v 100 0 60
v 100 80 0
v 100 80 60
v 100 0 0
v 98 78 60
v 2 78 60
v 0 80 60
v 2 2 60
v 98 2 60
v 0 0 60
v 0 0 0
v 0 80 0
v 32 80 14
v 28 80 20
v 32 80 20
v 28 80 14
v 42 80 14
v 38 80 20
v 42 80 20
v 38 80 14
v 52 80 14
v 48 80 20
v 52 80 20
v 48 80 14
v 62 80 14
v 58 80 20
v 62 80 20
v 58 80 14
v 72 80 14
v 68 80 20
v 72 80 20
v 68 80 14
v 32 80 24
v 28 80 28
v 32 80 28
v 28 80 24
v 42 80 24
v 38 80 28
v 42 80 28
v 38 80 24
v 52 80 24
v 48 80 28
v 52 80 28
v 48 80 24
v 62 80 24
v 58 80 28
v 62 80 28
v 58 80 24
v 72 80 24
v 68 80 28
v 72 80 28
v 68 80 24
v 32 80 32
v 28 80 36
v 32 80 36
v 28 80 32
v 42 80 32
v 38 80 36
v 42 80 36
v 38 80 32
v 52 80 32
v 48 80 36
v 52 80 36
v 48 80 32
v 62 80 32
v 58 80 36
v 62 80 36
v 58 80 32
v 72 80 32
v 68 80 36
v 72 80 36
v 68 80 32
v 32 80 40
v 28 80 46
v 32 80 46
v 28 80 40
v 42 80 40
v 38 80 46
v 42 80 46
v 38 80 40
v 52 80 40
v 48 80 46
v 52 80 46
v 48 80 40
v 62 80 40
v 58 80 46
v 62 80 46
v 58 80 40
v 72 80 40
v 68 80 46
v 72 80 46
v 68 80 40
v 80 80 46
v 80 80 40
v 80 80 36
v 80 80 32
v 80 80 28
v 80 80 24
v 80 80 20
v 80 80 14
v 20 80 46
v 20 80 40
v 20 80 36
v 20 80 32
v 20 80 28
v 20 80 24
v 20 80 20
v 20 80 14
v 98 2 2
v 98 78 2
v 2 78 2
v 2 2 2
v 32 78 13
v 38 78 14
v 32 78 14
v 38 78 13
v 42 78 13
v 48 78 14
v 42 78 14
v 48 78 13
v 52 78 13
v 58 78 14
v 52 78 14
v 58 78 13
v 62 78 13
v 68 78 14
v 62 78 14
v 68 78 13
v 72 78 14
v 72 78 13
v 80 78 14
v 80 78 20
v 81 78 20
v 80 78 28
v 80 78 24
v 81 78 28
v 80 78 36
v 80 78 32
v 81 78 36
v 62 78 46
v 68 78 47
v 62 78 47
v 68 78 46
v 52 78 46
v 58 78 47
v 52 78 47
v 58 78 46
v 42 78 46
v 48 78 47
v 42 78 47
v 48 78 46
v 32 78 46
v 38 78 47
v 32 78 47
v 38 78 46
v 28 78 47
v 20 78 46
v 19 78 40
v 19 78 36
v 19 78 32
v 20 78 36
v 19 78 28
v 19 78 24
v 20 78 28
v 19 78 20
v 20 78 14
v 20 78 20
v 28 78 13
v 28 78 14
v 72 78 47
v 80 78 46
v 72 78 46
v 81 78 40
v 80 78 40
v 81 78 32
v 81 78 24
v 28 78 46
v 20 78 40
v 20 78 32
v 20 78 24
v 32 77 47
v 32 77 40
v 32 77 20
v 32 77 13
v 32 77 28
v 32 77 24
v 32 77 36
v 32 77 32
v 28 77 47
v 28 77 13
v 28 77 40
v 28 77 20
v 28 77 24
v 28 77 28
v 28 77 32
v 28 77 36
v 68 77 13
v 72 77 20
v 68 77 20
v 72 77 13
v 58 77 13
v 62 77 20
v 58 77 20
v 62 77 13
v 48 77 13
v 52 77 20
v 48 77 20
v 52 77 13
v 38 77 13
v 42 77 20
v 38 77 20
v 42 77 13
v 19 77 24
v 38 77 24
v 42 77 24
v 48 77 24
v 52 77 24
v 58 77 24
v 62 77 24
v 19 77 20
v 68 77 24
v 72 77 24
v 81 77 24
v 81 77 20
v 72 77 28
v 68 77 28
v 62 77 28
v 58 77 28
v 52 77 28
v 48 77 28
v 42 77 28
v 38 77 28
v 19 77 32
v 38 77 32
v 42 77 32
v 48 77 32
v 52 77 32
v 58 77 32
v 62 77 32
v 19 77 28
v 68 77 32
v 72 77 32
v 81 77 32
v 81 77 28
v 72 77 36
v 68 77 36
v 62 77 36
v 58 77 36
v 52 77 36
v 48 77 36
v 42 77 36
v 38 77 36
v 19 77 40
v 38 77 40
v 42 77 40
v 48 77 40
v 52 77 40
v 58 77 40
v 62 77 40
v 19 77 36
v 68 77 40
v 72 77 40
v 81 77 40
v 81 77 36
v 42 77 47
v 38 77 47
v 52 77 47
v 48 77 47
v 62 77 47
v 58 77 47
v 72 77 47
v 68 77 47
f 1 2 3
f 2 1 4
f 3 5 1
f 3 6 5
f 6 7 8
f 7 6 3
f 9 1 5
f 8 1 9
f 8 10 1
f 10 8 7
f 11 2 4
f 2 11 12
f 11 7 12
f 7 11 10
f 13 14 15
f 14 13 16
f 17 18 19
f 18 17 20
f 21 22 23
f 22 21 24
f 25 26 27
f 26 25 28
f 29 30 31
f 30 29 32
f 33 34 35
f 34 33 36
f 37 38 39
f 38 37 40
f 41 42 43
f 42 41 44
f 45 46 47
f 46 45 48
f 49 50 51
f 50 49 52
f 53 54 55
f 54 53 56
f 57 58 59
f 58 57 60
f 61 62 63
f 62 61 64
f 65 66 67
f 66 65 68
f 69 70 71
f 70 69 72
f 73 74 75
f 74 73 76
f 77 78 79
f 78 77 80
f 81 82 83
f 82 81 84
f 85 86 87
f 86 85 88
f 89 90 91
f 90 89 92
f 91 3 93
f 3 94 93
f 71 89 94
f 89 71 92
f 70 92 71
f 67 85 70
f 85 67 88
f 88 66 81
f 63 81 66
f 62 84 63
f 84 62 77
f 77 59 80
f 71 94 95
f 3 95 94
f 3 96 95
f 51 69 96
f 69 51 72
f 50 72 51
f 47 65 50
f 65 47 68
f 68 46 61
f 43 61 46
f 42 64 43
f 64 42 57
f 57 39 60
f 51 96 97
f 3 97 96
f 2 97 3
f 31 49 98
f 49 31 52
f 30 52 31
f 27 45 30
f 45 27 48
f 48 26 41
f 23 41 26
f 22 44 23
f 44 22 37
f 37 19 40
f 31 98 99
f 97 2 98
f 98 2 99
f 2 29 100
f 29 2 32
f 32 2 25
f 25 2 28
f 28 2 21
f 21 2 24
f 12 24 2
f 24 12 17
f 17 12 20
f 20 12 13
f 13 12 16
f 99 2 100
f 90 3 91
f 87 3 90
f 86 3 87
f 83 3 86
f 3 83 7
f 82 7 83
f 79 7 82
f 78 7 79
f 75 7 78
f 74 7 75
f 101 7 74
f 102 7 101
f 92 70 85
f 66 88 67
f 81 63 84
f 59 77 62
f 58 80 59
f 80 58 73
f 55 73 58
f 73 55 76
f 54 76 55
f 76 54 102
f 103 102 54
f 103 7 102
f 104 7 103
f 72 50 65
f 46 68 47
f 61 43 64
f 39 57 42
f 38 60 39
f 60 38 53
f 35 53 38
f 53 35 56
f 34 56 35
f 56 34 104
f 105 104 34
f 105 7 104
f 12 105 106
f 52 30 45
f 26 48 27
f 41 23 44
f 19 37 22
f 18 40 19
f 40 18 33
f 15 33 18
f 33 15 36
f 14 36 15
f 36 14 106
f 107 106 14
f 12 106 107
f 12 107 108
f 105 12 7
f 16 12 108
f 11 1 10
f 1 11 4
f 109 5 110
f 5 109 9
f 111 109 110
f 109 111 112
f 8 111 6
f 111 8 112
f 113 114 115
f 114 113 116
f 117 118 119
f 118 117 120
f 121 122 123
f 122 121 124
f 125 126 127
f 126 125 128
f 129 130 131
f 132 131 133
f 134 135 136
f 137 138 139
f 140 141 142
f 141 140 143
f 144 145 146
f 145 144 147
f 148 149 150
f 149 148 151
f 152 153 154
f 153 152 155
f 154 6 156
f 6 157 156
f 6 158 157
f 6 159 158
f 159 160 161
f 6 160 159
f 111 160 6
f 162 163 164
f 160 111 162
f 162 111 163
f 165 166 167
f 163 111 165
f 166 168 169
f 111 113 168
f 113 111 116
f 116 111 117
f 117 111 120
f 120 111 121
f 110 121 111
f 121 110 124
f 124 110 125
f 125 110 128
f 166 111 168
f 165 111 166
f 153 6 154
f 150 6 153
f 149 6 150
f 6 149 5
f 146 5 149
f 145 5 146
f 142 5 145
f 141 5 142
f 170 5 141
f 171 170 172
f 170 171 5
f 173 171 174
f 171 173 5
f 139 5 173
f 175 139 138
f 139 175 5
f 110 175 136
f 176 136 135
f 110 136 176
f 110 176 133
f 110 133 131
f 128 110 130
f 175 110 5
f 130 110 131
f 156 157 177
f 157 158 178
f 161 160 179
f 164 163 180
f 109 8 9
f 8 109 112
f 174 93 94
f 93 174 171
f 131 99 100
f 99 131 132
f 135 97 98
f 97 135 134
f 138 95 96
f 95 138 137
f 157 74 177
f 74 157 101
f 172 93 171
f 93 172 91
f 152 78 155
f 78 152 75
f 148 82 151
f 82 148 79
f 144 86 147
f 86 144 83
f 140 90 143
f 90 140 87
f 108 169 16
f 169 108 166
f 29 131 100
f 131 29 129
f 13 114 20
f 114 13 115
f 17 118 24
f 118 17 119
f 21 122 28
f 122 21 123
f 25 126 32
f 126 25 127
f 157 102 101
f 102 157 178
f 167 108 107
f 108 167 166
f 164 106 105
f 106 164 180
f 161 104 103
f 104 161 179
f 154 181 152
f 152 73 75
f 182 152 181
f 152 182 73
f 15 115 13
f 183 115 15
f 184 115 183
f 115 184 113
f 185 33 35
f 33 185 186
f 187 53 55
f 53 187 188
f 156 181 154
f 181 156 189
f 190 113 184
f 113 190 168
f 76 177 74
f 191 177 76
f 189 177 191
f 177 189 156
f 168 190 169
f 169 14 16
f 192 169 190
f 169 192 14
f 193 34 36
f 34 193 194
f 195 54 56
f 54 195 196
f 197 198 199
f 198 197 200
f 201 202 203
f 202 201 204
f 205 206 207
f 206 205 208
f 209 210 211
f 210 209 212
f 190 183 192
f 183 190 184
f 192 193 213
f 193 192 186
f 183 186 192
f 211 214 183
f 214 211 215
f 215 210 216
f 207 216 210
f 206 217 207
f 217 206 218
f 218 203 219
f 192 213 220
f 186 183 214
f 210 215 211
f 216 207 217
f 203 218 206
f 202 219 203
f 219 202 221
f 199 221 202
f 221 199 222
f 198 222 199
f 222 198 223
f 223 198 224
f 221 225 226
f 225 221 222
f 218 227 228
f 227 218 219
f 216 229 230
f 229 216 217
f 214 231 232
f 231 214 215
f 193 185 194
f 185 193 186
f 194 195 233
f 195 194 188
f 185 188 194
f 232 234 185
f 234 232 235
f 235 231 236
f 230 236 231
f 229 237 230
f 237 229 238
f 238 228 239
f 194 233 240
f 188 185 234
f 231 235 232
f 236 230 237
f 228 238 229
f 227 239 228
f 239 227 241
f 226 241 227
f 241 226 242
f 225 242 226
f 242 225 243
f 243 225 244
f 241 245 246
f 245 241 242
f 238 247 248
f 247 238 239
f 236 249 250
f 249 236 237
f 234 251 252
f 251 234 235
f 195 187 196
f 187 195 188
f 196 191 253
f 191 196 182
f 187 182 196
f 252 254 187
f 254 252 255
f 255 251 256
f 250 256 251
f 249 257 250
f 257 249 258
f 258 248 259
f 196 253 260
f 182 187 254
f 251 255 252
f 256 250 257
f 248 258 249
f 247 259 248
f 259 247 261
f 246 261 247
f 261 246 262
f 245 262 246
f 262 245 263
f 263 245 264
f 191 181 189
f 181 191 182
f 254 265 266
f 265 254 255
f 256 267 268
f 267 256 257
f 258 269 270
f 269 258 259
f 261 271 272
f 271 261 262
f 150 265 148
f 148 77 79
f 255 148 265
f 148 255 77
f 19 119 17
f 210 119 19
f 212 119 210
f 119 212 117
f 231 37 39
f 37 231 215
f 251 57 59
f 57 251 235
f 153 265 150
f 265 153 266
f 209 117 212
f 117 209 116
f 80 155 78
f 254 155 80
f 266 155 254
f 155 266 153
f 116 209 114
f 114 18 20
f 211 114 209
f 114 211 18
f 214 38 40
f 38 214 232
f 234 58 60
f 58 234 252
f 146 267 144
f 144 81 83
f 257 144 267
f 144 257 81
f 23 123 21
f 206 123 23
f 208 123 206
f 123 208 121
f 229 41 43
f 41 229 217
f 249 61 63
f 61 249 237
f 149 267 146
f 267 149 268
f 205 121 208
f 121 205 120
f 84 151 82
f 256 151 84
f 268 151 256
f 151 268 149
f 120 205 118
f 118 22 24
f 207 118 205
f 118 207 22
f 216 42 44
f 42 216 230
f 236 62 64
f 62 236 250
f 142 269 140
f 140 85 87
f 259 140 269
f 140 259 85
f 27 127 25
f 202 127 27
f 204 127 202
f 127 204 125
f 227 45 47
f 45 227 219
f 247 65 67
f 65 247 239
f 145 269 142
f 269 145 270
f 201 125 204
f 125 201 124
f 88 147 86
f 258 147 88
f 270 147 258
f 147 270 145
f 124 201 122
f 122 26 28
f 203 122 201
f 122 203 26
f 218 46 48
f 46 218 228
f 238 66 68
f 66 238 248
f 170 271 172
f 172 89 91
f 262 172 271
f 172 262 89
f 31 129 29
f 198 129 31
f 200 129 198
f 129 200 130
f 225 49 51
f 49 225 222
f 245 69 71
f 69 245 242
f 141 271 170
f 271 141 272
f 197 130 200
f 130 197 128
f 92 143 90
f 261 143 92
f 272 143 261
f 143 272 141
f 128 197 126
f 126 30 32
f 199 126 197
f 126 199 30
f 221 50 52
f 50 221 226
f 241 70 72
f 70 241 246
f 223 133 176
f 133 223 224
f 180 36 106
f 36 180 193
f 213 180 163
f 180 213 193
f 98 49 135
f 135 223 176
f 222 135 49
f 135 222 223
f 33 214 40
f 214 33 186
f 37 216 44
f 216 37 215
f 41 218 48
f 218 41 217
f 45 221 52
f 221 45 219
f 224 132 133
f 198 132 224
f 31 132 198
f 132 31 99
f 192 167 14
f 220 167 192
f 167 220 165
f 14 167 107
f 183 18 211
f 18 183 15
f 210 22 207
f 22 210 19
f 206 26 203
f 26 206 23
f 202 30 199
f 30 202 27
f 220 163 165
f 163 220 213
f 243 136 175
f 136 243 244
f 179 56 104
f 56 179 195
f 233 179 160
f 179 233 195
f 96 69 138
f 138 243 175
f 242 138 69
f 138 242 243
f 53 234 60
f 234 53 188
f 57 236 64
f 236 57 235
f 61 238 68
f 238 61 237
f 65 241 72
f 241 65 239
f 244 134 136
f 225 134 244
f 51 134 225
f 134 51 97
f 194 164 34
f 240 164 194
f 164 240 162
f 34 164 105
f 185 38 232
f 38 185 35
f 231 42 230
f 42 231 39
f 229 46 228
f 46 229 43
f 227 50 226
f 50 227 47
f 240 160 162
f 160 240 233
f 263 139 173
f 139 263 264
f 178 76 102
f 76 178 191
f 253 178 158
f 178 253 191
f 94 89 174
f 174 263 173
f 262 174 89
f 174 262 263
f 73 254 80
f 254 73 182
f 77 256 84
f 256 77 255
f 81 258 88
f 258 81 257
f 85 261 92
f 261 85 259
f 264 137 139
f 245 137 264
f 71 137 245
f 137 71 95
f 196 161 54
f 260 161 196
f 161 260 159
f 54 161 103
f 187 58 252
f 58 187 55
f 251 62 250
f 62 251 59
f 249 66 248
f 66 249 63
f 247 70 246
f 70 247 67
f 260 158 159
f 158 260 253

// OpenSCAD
$fn = 32;

// ----------------------------------------------------------------------
// Vent box: crossgrid enclosure
// ----------------------------------------------------------------------

// --- parameters (mm) ---
box_l = 100;              // box length, X
box_w = 80;               // box width, Y
box_h = 60;               // box height, Z
wall_t = 2;               // shell wall thickness
win_l = 60;               // vent window width, X
win_h = 32;               // vent window height, Z
bar_w = 4;                // grid bar width
n_v = 5;                  // vertical bar count
n_h = 3;                  // horizontal bar count

win_z0 = (box_h - win_h) / 2;  // window lower edge Z
v_step = win_l / (n_v + 1);  // vertical bar step
h_step = win_h / (n_h + 1);  // horizontal bar step

difference() {
  union() {
    difference() {
      cube([box_l, box_w, box_h]);
  translate([wall_t, wall_t, wall_t])
    cube([box_l - 2 * wall_t, box_w - 2 * wall_t, box_h]);
  translate([(box_l - win_l) / 2, box_w - wall_t - 1, win_z0])
    cube([win_l, wall_t + 2, win_h]);
    }
    for (i = [1 : n_v])
      translate([(box_l - win_l) / 2 + i * v_step - bar_w / 2,
                 box_w - wall_t - 1, win_z0 - 1])
        cube([bar_w, wall_t + 1, win_h + 2]);
    for (i = [1 : n_h])
      translate([(box_l - win_l) / 2 - 1, box_w - wall_t - 1,
                 win_z0 + i * h_step - bar_w / 2])
        cube([win_l + 2, wall_t + 1, bar_w]);
  }
}
